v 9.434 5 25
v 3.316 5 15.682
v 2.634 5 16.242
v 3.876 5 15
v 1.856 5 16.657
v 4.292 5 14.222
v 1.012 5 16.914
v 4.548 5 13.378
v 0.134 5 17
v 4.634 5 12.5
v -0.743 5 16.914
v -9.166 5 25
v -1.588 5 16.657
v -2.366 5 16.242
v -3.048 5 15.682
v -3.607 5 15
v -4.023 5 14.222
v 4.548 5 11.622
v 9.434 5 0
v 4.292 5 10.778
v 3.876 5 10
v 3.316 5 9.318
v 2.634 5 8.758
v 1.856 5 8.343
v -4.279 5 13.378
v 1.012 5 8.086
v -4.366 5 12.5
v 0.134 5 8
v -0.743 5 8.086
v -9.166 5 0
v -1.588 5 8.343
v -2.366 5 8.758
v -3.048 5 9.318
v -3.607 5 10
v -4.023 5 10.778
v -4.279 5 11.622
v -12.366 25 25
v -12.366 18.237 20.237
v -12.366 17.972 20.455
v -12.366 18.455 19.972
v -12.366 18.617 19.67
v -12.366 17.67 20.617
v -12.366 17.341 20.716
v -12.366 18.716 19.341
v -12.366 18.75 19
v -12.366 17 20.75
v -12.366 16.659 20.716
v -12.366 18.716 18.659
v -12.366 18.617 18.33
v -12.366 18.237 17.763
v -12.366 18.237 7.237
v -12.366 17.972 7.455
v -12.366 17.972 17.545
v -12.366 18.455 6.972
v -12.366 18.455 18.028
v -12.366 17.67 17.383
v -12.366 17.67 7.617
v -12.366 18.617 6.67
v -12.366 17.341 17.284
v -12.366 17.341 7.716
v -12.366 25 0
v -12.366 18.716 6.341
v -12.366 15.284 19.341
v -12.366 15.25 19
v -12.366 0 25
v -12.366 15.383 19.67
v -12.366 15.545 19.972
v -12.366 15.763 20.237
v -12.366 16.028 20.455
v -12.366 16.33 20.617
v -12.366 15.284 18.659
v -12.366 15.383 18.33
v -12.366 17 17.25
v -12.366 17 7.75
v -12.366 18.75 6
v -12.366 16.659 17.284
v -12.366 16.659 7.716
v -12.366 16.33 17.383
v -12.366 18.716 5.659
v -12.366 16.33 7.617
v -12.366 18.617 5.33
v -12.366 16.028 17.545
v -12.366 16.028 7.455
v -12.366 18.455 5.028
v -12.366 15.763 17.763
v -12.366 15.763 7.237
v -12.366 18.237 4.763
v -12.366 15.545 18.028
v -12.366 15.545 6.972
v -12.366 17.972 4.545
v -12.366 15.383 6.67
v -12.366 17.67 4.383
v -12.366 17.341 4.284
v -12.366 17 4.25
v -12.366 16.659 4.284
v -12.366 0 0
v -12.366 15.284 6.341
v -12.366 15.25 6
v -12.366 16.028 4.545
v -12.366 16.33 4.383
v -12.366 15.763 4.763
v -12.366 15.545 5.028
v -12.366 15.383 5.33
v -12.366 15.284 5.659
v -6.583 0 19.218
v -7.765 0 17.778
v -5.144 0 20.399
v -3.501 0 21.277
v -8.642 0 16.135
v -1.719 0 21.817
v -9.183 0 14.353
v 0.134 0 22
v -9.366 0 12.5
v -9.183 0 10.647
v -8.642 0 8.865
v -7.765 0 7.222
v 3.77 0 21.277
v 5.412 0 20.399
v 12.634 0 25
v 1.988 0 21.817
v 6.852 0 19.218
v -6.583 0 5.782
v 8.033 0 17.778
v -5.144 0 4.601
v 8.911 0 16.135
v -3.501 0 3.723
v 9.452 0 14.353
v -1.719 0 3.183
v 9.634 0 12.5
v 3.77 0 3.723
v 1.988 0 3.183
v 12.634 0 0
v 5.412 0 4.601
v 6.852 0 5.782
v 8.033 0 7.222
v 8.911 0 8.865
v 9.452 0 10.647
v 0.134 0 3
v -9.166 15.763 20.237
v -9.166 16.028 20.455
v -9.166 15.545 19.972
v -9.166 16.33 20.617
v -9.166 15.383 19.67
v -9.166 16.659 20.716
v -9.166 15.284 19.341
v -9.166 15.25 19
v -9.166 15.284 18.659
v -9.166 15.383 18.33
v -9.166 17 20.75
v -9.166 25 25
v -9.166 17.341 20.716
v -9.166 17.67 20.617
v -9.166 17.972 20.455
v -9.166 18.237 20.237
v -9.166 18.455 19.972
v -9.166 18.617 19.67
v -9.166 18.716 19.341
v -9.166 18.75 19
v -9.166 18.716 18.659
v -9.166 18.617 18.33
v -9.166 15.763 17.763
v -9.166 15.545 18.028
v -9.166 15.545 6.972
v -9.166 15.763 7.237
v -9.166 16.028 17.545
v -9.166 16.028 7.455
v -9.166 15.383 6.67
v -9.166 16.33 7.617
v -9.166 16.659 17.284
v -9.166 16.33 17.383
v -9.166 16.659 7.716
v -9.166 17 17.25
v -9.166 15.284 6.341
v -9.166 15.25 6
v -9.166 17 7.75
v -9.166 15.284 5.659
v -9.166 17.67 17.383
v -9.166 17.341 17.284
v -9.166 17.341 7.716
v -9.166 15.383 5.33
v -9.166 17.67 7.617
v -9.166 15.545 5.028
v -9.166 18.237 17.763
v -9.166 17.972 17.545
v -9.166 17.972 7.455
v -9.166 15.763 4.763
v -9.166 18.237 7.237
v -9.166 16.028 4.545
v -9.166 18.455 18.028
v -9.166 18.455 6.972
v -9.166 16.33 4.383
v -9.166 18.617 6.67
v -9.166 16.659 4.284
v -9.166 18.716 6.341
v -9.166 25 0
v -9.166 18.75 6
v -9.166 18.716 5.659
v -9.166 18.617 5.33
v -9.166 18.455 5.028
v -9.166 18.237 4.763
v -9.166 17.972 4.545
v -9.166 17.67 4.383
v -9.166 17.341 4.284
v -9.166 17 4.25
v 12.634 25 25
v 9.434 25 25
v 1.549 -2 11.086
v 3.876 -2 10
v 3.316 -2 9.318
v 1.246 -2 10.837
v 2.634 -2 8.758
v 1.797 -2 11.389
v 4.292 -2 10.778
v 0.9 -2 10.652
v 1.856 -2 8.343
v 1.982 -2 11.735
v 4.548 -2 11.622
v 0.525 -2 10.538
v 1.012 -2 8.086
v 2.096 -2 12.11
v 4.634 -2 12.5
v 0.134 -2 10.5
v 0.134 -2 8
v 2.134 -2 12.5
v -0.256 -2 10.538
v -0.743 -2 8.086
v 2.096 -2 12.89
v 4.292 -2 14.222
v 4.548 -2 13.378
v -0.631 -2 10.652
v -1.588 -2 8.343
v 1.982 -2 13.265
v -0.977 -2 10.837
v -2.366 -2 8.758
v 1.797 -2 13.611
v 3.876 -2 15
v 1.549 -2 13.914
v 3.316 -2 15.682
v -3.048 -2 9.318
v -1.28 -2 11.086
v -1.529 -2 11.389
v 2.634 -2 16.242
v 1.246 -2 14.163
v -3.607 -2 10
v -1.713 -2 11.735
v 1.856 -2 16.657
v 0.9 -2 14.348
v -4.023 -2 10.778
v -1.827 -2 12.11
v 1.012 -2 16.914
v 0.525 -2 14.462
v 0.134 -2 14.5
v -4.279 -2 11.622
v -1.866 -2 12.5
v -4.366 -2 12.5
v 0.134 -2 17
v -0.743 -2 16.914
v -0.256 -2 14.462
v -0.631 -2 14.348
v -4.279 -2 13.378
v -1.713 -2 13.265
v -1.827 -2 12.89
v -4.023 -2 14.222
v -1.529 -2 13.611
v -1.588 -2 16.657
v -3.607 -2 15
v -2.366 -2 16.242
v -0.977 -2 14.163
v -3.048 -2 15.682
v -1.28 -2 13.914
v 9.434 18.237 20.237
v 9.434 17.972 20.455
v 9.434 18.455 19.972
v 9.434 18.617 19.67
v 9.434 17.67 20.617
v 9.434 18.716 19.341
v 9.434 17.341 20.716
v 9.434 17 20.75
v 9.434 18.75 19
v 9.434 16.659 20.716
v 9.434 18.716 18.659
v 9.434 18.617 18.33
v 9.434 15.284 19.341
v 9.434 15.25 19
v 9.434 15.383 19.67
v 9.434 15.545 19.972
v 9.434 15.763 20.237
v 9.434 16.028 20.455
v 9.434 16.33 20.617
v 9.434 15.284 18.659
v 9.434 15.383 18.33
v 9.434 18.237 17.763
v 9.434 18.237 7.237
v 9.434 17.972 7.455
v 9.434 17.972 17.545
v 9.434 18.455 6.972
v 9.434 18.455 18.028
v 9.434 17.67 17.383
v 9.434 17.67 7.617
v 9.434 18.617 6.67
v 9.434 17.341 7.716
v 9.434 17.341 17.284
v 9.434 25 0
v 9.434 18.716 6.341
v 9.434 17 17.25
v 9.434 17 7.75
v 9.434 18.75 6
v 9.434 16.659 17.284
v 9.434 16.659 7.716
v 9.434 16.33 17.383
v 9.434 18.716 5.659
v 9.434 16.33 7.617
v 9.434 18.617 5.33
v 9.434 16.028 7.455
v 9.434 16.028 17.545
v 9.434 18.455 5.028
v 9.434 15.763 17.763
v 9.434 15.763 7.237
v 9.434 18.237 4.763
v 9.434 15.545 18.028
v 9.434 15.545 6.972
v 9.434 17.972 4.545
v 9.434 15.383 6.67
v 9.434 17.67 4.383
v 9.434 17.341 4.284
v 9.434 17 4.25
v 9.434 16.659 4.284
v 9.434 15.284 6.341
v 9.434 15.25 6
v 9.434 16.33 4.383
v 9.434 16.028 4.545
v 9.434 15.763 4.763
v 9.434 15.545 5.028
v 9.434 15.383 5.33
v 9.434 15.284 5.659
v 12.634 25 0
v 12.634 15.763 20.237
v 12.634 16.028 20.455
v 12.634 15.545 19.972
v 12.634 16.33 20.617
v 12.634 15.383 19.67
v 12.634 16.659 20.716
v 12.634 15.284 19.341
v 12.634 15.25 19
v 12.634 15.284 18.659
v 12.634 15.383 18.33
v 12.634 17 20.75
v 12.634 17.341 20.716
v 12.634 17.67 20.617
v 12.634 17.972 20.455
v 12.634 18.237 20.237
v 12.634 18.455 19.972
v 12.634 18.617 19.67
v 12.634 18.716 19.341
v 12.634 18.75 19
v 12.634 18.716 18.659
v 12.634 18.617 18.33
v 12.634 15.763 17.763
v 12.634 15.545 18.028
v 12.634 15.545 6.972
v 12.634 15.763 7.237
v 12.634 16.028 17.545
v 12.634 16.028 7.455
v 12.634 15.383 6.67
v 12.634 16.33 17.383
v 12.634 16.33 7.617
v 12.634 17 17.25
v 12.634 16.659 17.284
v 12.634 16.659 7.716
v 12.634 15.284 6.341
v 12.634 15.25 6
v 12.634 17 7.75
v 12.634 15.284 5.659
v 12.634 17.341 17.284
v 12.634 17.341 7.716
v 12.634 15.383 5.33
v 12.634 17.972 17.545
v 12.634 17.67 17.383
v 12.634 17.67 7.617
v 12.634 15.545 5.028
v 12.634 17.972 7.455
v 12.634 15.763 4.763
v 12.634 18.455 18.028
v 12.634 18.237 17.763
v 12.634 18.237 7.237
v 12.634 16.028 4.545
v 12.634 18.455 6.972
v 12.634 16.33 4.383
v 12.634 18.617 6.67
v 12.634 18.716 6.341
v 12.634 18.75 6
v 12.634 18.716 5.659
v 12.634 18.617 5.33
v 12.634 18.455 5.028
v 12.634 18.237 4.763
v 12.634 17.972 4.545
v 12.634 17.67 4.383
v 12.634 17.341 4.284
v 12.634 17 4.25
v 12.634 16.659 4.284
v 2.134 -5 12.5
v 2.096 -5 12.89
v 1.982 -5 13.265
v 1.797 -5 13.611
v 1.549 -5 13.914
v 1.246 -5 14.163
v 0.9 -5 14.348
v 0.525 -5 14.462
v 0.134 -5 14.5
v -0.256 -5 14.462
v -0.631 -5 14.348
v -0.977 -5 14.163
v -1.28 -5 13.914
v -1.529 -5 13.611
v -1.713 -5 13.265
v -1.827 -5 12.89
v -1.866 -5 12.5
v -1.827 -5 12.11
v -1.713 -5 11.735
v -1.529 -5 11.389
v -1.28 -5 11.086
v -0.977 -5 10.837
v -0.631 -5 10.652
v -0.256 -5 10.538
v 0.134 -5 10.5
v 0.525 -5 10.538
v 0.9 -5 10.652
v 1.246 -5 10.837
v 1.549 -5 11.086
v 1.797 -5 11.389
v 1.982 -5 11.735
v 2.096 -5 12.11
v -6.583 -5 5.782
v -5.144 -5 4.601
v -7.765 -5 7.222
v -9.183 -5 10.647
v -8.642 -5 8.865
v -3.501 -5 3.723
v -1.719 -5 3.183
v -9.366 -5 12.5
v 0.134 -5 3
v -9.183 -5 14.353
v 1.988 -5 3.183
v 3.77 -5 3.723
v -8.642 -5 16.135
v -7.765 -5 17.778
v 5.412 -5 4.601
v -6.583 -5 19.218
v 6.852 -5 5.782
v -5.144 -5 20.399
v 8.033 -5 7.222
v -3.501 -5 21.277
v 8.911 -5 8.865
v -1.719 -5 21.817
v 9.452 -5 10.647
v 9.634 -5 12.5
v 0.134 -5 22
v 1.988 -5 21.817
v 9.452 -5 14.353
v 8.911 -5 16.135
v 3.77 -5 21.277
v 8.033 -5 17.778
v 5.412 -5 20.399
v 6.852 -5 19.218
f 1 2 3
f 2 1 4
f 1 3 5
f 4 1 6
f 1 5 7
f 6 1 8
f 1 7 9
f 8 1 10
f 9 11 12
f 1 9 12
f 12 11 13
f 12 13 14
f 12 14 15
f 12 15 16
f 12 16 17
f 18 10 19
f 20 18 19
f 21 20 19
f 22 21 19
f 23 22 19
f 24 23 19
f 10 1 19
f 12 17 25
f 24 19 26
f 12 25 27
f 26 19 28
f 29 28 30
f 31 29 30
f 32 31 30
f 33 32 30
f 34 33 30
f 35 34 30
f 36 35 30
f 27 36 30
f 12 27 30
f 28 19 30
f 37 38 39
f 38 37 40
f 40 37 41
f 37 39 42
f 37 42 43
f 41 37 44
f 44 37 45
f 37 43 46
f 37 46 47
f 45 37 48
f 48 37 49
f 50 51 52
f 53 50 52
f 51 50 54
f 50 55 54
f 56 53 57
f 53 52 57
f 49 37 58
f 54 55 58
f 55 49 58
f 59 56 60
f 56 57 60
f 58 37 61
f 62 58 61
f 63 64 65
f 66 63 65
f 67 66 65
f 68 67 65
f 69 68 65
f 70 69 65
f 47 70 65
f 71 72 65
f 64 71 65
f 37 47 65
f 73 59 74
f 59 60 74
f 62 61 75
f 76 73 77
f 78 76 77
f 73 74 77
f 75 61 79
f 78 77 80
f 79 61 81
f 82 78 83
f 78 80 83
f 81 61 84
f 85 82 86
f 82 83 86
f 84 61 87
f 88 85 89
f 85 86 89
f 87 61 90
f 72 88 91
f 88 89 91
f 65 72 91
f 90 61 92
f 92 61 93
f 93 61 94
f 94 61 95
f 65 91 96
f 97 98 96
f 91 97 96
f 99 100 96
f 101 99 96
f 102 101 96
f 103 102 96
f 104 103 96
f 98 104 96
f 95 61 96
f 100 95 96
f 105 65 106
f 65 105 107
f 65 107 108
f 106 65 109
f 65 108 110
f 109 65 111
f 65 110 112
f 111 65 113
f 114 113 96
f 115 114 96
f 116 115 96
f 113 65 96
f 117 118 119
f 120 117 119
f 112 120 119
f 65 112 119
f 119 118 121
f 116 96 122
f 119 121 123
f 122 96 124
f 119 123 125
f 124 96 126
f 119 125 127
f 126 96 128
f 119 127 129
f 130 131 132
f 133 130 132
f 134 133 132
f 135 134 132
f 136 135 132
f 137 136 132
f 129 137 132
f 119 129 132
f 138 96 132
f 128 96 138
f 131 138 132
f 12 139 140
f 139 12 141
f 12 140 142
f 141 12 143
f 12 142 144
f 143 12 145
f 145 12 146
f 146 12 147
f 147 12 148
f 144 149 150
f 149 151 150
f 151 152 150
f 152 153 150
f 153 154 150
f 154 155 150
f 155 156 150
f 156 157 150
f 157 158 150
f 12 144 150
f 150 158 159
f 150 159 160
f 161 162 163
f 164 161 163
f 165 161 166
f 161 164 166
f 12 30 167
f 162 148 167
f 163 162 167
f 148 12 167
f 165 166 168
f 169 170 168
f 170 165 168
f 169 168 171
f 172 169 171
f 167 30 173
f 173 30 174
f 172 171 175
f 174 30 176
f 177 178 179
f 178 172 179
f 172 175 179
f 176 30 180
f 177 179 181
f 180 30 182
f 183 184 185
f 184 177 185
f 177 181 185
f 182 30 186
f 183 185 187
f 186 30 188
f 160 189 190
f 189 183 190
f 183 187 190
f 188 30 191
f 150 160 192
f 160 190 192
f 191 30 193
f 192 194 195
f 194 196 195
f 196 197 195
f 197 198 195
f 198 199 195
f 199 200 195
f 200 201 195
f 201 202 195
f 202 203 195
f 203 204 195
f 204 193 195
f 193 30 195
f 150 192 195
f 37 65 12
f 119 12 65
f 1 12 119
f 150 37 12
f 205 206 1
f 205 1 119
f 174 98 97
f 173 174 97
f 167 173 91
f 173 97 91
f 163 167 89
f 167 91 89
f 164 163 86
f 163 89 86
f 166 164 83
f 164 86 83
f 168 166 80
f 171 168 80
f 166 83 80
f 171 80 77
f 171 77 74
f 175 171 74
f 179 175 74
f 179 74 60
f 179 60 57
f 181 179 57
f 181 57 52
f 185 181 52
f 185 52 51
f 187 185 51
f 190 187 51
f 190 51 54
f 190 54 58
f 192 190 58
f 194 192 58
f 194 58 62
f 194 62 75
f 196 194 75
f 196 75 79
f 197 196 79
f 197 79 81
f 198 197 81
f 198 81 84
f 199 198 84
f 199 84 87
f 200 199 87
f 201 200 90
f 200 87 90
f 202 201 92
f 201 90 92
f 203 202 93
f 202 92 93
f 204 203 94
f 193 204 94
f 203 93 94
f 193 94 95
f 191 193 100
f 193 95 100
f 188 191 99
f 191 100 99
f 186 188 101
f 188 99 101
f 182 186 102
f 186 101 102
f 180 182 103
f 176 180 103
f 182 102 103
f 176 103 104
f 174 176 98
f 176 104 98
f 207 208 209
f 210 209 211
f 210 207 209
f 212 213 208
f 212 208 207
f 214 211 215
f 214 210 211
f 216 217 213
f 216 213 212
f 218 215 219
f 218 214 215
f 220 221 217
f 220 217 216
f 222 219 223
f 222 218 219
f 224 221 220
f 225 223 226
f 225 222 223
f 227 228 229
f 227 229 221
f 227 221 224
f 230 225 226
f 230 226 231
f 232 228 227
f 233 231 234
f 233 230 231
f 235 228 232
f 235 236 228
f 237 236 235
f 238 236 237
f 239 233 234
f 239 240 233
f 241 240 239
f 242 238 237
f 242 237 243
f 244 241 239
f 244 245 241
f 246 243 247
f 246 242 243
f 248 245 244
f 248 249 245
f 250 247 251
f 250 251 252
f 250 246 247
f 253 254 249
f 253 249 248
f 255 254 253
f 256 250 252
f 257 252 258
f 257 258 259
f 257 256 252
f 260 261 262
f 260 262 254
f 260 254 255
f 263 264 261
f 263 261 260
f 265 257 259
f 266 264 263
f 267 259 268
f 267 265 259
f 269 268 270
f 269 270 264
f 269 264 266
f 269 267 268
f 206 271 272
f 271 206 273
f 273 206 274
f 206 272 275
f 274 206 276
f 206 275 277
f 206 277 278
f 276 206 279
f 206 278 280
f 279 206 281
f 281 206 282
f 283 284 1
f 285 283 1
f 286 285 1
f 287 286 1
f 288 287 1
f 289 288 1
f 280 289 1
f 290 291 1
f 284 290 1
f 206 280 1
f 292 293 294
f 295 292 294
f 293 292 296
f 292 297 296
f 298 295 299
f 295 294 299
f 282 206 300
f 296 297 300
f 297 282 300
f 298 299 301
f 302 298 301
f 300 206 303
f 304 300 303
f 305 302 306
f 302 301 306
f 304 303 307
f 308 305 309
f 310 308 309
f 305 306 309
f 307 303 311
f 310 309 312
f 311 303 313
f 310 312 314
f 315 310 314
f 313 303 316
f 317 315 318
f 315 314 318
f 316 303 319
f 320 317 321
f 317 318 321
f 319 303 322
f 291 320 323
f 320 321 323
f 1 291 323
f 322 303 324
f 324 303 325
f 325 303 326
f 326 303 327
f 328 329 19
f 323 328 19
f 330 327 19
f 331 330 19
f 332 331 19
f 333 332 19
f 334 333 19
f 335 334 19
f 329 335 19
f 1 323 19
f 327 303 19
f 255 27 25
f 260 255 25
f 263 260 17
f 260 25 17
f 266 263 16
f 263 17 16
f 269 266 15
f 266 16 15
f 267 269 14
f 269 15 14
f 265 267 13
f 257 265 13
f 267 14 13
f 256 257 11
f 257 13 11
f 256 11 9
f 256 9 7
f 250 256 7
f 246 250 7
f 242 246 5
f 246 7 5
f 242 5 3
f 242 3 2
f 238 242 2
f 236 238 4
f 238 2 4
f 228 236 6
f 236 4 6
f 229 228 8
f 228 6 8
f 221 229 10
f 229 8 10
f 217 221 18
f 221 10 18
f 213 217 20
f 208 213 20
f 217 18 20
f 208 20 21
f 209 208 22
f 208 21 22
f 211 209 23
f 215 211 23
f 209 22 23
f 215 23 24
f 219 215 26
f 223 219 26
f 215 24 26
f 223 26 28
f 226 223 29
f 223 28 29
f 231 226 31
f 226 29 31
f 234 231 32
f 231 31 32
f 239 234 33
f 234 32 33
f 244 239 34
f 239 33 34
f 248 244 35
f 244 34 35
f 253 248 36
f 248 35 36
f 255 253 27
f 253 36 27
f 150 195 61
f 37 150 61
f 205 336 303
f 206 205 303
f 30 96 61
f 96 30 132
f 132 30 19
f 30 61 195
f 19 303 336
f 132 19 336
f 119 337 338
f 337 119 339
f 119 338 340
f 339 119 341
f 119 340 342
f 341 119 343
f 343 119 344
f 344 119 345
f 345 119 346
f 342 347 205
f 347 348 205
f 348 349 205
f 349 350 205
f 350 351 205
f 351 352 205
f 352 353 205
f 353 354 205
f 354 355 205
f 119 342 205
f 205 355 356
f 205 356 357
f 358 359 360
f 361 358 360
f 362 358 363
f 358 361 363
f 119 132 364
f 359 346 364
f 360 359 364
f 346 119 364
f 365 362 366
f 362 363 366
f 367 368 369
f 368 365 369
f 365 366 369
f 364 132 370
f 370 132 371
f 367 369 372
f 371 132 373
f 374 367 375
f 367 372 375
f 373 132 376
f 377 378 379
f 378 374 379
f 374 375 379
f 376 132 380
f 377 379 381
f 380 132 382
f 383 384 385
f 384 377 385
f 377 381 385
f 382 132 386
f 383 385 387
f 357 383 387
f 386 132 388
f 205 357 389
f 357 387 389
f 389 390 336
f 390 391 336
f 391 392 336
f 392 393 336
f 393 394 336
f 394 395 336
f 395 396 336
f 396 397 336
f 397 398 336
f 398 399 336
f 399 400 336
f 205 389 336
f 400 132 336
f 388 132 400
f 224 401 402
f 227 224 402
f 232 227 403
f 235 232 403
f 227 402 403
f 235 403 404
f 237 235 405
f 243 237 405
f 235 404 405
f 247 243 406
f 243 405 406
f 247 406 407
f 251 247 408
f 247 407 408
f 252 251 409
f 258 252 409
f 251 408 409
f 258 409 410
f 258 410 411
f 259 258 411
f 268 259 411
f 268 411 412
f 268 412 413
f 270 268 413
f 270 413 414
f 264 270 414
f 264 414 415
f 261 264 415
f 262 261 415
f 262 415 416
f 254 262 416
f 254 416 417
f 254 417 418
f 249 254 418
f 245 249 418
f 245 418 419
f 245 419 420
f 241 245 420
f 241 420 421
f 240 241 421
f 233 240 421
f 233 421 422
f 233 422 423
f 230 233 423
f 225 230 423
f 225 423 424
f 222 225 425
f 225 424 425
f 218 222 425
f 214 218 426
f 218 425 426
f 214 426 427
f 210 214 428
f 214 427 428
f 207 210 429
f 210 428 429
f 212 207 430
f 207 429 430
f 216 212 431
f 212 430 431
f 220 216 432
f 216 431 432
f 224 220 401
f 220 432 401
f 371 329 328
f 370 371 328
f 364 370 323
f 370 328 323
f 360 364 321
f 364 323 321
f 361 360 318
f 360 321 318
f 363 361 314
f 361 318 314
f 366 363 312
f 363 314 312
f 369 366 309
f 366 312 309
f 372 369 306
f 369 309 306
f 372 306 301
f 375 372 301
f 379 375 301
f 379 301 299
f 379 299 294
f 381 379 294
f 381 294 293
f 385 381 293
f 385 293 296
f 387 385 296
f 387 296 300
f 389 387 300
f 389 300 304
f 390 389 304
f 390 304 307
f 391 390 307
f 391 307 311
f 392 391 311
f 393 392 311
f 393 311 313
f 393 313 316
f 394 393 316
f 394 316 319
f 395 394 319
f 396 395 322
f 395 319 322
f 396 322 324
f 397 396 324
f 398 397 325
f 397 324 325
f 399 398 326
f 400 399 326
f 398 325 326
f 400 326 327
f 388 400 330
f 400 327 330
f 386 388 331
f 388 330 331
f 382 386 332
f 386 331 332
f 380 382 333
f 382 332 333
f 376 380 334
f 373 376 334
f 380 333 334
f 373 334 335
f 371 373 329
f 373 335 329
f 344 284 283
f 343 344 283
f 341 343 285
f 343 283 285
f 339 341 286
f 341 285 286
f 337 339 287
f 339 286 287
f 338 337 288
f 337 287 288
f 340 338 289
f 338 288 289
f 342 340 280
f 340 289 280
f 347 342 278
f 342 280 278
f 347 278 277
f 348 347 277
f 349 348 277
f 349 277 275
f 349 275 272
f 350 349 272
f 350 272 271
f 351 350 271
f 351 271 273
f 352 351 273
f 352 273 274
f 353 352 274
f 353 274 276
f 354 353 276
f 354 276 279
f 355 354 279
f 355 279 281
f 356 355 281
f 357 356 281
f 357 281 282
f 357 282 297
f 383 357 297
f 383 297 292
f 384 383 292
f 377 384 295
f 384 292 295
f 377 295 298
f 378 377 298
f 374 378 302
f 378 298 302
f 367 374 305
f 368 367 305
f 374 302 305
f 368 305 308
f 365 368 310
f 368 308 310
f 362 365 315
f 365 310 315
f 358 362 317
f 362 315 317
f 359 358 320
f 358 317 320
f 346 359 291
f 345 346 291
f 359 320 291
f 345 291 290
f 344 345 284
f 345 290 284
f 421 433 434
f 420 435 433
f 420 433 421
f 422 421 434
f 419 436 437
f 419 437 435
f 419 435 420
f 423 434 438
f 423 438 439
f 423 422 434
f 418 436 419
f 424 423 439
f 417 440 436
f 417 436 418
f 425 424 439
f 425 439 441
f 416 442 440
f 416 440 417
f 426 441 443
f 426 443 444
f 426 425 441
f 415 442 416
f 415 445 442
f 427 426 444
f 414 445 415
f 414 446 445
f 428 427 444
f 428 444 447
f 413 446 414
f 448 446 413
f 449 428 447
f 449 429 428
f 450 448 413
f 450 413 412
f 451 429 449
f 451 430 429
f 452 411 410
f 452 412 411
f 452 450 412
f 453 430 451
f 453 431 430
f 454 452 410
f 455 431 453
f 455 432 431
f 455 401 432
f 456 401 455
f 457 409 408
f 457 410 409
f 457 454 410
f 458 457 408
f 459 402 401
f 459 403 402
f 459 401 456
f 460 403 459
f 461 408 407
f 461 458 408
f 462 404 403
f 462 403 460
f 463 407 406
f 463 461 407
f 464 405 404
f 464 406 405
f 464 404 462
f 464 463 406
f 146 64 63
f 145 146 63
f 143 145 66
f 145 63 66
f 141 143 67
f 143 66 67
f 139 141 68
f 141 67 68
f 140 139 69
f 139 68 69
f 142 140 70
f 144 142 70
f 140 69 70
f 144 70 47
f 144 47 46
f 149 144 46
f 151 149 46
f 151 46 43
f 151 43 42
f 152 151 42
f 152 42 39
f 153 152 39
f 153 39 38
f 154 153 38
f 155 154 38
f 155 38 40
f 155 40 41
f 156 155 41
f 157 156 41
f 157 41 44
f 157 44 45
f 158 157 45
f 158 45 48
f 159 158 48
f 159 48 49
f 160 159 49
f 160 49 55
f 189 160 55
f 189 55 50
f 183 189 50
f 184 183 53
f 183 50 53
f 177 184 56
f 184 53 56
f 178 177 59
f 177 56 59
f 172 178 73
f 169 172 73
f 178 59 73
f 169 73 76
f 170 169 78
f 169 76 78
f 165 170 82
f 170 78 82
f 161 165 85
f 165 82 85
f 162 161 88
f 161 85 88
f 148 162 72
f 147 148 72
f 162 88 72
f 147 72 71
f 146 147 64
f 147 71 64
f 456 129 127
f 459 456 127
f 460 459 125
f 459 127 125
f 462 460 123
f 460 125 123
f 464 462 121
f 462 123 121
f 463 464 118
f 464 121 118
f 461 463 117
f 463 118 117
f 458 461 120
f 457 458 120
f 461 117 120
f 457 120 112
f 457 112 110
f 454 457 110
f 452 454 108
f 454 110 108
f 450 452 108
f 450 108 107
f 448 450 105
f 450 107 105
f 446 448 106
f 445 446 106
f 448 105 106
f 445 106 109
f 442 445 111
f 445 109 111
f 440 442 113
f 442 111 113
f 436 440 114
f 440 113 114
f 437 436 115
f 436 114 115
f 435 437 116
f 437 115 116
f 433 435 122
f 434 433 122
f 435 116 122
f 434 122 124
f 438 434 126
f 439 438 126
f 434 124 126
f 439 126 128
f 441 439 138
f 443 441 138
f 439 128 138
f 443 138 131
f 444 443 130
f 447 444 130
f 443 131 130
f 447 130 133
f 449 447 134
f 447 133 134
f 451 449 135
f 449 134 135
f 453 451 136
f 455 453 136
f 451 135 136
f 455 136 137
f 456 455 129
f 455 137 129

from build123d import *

# Parameters (mm, degrees)
F1_DEPTH = 25
F2_R     = 9.5
F3_DEPTH = 5
F4_R     = 2
F5_DEPTH = 30.001
F6_R     = 4.5
F7_DEPTH = 7
F8_R     = 1.75
F9_DEPTH = 25.001


with BuildPart() as f1:
    # F0 (on Top) → F1 (new body)
    with BuildSketch(Plane.XY):
        Polygon((-12.365591, 25), (-12.365591, 0), (12.634409, 0), (12.634409, 25), (9.434409, 25), (9.434409, 5), (-9.165591, 5), (-9.165591, 25), align=None)
    extrude(amount=F1_DEPTH)

    # F2 (on face) → F3 (join)
    with BuildSketch(Plane.XZ):
        with Locations((0.134409, 12.5)):
            Circle(F2_R)
    extrude(amount=F3_DEPTH)

    # F4 (on face) → F5 (cut, through all)
    with BuildSketch(Plane.XZ.offset(5)):
        with Locations((0.134409, 12.5)):
            Circle(F4_R)
    extrude(amount=-F5_DEPTH, mode=Mode.SUBTRACT)

    # F6 (on face) → F7 (cut)
    with BuildSketch(Plane(origin=(0, 5, 0), x_dir=(-1, 0, 0), z_dir=(0, 1, 0))):
        with Locations((-0.134409, 12.5)):
            Circle(F6_R)
    extrude(amount=-F7_DEPTH, mode=Mode.SUBTRACT)

    # F8 (on face) → F9 (cut, through all)
    with BuildSketch(Plane(origin=(-12.365591, 0, 0), x_dir=(0, -1, 0), z_dir=(-1, 0, 0))):
        with Locations((-17, 6)):
            Circle(F8_R)
        with Locations((-17, 19)):
            Circle(F8_R)
    extrude(amount=-F9_DEPTH, mode=Mode.SUBTRACT)


solid = f1.part
